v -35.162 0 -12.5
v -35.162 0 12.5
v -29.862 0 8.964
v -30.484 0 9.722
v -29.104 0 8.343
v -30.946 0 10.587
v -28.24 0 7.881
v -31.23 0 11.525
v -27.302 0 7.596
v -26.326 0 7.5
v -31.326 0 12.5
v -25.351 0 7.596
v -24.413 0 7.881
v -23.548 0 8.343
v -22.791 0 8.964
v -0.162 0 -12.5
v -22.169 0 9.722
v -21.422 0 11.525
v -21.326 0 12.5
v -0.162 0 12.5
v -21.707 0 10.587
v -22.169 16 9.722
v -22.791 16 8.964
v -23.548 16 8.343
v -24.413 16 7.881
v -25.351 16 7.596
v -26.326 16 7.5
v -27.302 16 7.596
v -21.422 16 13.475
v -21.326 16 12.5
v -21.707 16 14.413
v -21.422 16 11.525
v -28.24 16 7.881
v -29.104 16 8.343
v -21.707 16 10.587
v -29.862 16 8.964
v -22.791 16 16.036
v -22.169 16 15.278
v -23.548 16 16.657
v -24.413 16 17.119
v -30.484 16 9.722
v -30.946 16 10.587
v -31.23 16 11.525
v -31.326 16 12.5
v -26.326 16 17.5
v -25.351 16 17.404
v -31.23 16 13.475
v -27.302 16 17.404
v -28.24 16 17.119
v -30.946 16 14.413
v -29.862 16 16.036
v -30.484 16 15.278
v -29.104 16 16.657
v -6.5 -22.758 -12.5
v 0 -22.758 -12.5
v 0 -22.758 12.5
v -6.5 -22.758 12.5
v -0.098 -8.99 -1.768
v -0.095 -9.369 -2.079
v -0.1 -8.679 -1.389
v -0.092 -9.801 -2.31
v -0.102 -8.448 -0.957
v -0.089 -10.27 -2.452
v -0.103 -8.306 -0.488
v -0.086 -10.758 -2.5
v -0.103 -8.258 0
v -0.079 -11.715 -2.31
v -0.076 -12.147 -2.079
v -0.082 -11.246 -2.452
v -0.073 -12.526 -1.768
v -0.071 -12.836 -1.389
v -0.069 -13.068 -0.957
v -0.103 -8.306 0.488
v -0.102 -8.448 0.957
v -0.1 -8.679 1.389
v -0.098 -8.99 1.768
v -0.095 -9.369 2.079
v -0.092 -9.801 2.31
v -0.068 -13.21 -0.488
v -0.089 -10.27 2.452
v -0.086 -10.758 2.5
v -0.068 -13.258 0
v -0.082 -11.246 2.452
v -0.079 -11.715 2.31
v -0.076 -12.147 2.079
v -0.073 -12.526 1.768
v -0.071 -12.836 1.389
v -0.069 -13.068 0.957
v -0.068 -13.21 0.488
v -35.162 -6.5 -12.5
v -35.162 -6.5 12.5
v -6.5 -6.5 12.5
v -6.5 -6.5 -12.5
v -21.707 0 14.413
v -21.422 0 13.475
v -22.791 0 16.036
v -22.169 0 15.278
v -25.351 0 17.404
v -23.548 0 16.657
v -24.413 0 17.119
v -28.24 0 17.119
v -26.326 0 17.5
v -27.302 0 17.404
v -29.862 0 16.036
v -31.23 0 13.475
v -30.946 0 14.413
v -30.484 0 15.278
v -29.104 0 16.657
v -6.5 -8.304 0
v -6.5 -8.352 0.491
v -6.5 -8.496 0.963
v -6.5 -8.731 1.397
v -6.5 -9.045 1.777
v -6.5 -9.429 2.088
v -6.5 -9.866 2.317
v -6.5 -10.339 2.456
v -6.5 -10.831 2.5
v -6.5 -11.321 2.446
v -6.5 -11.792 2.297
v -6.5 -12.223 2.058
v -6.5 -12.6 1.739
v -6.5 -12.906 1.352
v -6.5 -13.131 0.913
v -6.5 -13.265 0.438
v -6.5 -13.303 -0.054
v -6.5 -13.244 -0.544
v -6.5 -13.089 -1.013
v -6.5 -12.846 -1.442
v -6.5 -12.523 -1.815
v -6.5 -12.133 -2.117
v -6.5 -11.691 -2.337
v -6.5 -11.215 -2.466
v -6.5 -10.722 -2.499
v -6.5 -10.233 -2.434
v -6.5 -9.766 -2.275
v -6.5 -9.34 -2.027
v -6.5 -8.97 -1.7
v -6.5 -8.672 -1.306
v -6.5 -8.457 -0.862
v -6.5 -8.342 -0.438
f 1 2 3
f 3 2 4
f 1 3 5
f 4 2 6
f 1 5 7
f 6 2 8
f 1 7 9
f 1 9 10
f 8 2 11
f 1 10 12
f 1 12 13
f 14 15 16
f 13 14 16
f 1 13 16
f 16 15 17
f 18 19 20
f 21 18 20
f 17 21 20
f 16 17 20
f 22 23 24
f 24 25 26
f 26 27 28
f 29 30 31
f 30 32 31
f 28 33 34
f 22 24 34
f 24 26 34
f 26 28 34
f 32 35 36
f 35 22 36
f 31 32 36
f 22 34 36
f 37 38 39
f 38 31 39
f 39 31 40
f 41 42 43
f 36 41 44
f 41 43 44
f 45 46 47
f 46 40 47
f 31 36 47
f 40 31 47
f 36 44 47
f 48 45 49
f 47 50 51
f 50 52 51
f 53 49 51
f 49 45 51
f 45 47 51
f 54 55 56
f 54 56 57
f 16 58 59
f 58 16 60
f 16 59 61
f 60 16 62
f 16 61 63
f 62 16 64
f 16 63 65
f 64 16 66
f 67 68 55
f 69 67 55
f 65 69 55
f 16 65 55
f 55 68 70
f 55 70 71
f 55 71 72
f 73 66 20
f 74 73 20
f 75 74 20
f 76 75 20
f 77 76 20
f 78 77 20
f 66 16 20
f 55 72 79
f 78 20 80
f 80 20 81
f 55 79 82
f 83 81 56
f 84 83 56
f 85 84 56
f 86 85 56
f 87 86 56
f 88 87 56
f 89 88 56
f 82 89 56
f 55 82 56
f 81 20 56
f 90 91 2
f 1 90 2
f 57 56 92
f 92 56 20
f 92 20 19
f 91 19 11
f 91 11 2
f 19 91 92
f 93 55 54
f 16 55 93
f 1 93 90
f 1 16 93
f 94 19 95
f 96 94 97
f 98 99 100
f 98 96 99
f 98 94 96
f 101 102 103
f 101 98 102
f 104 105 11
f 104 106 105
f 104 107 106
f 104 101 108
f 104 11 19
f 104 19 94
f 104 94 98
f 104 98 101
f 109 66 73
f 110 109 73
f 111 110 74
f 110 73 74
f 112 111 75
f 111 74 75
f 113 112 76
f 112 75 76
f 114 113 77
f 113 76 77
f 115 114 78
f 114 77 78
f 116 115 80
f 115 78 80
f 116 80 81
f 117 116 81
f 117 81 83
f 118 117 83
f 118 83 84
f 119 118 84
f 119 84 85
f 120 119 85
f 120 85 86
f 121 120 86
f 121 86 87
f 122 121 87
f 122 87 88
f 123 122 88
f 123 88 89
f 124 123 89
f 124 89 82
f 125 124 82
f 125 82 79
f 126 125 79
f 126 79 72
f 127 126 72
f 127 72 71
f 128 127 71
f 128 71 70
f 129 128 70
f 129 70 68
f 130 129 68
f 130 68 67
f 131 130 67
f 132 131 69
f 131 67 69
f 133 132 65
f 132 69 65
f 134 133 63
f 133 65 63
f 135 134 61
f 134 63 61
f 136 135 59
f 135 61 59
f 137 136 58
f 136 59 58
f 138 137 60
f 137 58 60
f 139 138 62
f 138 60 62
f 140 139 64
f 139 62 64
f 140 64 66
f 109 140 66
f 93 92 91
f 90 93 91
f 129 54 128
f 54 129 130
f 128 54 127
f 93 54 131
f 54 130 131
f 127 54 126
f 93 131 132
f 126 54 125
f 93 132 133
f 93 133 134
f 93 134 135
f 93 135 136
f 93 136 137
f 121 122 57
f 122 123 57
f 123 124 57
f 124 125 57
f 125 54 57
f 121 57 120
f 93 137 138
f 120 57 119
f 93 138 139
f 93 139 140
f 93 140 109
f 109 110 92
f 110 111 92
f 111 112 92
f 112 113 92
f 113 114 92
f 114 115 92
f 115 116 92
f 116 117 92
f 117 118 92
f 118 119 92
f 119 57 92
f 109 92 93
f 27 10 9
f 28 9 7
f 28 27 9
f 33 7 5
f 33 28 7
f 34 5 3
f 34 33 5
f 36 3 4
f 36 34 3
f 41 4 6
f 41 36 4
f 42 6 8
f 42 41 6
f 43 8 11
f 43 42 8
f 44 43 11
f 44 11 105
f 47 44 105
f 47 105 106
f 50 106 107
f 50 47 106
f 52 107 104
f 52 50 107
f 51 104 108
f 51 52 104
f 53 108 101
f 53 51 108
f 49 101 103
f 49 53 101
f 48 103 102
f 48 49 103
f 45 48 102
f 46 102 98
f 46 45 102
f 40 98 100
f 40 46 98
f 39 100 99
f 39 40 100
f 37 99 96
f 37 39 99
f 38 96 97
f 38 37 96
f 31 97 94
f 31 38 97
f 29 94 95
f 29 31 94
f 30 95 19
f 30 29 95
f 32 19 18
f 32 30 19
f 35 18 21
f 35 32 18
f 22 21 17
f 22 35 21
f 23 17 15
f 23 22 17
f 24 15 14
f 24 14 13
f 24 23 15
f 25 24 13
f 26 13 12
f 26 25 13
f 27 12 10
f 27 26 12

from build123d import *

# Parameters (mm, degrees)
SALIENTE_EXTRUIR1_DEPTH = 12.5
CROQUIS5_R              = 2.5
CORTAR_EXTRUIR1_DEPTH   = 25
CROQUIS15_W             = 5
CROQUIS15_H             = 16


with BuildPart() as part:
    # Croquis1 → Saliente-Extruir1 (new, symmetric)
    with BuildSketch(Plane.XY):
        Polygon((-35.162289575, 0), (-0.162289575, 0), (0, -22.757556118), (-6.5, -22.757556118), (-6.5, -6.5), (-35.162289575, -6.5), align=None)
    extrude(amount=SALIENTE_EXTRUIR1_DEPTH, both=True)

    # Croquis5 → Cortar-Extruir1 (cut)
    with BuildSketch(Plane(origin=(-0.162281322, -0.001157267, 0), x_dir=(0, 0, -1), z_dir=(0.9999745736838829, 0.007131057827339795, 0))):
        with Locations(Location((0, -10.756977477, 0), (0, 0, 90))):
            Circle(CROQUIS5_R)
    extrude(amount=-CORTAR_EXTRUIR1_DEPTH, mode=Mode.SUBTRACT)

    # Croquis15 → Revolución2 (revolve)
    with BuildSketch(Plane.XY.offset(12.5), mode=Mode.PRIVATE) as revoluci_n2_sk:
        with Locations((-23.826251853, 8)):
            Rectangle(CROQUIS15_W, CROQUIS15_H)
    revolve(revoluci_n2_sk.sketch.rotate(Axis((-26.326251853, 0, 12.5), (0, 1, 0)), 90), axis=Axis((-26.326251853, 0, 12.5), (0, 1, 0)))


solid = part.part
